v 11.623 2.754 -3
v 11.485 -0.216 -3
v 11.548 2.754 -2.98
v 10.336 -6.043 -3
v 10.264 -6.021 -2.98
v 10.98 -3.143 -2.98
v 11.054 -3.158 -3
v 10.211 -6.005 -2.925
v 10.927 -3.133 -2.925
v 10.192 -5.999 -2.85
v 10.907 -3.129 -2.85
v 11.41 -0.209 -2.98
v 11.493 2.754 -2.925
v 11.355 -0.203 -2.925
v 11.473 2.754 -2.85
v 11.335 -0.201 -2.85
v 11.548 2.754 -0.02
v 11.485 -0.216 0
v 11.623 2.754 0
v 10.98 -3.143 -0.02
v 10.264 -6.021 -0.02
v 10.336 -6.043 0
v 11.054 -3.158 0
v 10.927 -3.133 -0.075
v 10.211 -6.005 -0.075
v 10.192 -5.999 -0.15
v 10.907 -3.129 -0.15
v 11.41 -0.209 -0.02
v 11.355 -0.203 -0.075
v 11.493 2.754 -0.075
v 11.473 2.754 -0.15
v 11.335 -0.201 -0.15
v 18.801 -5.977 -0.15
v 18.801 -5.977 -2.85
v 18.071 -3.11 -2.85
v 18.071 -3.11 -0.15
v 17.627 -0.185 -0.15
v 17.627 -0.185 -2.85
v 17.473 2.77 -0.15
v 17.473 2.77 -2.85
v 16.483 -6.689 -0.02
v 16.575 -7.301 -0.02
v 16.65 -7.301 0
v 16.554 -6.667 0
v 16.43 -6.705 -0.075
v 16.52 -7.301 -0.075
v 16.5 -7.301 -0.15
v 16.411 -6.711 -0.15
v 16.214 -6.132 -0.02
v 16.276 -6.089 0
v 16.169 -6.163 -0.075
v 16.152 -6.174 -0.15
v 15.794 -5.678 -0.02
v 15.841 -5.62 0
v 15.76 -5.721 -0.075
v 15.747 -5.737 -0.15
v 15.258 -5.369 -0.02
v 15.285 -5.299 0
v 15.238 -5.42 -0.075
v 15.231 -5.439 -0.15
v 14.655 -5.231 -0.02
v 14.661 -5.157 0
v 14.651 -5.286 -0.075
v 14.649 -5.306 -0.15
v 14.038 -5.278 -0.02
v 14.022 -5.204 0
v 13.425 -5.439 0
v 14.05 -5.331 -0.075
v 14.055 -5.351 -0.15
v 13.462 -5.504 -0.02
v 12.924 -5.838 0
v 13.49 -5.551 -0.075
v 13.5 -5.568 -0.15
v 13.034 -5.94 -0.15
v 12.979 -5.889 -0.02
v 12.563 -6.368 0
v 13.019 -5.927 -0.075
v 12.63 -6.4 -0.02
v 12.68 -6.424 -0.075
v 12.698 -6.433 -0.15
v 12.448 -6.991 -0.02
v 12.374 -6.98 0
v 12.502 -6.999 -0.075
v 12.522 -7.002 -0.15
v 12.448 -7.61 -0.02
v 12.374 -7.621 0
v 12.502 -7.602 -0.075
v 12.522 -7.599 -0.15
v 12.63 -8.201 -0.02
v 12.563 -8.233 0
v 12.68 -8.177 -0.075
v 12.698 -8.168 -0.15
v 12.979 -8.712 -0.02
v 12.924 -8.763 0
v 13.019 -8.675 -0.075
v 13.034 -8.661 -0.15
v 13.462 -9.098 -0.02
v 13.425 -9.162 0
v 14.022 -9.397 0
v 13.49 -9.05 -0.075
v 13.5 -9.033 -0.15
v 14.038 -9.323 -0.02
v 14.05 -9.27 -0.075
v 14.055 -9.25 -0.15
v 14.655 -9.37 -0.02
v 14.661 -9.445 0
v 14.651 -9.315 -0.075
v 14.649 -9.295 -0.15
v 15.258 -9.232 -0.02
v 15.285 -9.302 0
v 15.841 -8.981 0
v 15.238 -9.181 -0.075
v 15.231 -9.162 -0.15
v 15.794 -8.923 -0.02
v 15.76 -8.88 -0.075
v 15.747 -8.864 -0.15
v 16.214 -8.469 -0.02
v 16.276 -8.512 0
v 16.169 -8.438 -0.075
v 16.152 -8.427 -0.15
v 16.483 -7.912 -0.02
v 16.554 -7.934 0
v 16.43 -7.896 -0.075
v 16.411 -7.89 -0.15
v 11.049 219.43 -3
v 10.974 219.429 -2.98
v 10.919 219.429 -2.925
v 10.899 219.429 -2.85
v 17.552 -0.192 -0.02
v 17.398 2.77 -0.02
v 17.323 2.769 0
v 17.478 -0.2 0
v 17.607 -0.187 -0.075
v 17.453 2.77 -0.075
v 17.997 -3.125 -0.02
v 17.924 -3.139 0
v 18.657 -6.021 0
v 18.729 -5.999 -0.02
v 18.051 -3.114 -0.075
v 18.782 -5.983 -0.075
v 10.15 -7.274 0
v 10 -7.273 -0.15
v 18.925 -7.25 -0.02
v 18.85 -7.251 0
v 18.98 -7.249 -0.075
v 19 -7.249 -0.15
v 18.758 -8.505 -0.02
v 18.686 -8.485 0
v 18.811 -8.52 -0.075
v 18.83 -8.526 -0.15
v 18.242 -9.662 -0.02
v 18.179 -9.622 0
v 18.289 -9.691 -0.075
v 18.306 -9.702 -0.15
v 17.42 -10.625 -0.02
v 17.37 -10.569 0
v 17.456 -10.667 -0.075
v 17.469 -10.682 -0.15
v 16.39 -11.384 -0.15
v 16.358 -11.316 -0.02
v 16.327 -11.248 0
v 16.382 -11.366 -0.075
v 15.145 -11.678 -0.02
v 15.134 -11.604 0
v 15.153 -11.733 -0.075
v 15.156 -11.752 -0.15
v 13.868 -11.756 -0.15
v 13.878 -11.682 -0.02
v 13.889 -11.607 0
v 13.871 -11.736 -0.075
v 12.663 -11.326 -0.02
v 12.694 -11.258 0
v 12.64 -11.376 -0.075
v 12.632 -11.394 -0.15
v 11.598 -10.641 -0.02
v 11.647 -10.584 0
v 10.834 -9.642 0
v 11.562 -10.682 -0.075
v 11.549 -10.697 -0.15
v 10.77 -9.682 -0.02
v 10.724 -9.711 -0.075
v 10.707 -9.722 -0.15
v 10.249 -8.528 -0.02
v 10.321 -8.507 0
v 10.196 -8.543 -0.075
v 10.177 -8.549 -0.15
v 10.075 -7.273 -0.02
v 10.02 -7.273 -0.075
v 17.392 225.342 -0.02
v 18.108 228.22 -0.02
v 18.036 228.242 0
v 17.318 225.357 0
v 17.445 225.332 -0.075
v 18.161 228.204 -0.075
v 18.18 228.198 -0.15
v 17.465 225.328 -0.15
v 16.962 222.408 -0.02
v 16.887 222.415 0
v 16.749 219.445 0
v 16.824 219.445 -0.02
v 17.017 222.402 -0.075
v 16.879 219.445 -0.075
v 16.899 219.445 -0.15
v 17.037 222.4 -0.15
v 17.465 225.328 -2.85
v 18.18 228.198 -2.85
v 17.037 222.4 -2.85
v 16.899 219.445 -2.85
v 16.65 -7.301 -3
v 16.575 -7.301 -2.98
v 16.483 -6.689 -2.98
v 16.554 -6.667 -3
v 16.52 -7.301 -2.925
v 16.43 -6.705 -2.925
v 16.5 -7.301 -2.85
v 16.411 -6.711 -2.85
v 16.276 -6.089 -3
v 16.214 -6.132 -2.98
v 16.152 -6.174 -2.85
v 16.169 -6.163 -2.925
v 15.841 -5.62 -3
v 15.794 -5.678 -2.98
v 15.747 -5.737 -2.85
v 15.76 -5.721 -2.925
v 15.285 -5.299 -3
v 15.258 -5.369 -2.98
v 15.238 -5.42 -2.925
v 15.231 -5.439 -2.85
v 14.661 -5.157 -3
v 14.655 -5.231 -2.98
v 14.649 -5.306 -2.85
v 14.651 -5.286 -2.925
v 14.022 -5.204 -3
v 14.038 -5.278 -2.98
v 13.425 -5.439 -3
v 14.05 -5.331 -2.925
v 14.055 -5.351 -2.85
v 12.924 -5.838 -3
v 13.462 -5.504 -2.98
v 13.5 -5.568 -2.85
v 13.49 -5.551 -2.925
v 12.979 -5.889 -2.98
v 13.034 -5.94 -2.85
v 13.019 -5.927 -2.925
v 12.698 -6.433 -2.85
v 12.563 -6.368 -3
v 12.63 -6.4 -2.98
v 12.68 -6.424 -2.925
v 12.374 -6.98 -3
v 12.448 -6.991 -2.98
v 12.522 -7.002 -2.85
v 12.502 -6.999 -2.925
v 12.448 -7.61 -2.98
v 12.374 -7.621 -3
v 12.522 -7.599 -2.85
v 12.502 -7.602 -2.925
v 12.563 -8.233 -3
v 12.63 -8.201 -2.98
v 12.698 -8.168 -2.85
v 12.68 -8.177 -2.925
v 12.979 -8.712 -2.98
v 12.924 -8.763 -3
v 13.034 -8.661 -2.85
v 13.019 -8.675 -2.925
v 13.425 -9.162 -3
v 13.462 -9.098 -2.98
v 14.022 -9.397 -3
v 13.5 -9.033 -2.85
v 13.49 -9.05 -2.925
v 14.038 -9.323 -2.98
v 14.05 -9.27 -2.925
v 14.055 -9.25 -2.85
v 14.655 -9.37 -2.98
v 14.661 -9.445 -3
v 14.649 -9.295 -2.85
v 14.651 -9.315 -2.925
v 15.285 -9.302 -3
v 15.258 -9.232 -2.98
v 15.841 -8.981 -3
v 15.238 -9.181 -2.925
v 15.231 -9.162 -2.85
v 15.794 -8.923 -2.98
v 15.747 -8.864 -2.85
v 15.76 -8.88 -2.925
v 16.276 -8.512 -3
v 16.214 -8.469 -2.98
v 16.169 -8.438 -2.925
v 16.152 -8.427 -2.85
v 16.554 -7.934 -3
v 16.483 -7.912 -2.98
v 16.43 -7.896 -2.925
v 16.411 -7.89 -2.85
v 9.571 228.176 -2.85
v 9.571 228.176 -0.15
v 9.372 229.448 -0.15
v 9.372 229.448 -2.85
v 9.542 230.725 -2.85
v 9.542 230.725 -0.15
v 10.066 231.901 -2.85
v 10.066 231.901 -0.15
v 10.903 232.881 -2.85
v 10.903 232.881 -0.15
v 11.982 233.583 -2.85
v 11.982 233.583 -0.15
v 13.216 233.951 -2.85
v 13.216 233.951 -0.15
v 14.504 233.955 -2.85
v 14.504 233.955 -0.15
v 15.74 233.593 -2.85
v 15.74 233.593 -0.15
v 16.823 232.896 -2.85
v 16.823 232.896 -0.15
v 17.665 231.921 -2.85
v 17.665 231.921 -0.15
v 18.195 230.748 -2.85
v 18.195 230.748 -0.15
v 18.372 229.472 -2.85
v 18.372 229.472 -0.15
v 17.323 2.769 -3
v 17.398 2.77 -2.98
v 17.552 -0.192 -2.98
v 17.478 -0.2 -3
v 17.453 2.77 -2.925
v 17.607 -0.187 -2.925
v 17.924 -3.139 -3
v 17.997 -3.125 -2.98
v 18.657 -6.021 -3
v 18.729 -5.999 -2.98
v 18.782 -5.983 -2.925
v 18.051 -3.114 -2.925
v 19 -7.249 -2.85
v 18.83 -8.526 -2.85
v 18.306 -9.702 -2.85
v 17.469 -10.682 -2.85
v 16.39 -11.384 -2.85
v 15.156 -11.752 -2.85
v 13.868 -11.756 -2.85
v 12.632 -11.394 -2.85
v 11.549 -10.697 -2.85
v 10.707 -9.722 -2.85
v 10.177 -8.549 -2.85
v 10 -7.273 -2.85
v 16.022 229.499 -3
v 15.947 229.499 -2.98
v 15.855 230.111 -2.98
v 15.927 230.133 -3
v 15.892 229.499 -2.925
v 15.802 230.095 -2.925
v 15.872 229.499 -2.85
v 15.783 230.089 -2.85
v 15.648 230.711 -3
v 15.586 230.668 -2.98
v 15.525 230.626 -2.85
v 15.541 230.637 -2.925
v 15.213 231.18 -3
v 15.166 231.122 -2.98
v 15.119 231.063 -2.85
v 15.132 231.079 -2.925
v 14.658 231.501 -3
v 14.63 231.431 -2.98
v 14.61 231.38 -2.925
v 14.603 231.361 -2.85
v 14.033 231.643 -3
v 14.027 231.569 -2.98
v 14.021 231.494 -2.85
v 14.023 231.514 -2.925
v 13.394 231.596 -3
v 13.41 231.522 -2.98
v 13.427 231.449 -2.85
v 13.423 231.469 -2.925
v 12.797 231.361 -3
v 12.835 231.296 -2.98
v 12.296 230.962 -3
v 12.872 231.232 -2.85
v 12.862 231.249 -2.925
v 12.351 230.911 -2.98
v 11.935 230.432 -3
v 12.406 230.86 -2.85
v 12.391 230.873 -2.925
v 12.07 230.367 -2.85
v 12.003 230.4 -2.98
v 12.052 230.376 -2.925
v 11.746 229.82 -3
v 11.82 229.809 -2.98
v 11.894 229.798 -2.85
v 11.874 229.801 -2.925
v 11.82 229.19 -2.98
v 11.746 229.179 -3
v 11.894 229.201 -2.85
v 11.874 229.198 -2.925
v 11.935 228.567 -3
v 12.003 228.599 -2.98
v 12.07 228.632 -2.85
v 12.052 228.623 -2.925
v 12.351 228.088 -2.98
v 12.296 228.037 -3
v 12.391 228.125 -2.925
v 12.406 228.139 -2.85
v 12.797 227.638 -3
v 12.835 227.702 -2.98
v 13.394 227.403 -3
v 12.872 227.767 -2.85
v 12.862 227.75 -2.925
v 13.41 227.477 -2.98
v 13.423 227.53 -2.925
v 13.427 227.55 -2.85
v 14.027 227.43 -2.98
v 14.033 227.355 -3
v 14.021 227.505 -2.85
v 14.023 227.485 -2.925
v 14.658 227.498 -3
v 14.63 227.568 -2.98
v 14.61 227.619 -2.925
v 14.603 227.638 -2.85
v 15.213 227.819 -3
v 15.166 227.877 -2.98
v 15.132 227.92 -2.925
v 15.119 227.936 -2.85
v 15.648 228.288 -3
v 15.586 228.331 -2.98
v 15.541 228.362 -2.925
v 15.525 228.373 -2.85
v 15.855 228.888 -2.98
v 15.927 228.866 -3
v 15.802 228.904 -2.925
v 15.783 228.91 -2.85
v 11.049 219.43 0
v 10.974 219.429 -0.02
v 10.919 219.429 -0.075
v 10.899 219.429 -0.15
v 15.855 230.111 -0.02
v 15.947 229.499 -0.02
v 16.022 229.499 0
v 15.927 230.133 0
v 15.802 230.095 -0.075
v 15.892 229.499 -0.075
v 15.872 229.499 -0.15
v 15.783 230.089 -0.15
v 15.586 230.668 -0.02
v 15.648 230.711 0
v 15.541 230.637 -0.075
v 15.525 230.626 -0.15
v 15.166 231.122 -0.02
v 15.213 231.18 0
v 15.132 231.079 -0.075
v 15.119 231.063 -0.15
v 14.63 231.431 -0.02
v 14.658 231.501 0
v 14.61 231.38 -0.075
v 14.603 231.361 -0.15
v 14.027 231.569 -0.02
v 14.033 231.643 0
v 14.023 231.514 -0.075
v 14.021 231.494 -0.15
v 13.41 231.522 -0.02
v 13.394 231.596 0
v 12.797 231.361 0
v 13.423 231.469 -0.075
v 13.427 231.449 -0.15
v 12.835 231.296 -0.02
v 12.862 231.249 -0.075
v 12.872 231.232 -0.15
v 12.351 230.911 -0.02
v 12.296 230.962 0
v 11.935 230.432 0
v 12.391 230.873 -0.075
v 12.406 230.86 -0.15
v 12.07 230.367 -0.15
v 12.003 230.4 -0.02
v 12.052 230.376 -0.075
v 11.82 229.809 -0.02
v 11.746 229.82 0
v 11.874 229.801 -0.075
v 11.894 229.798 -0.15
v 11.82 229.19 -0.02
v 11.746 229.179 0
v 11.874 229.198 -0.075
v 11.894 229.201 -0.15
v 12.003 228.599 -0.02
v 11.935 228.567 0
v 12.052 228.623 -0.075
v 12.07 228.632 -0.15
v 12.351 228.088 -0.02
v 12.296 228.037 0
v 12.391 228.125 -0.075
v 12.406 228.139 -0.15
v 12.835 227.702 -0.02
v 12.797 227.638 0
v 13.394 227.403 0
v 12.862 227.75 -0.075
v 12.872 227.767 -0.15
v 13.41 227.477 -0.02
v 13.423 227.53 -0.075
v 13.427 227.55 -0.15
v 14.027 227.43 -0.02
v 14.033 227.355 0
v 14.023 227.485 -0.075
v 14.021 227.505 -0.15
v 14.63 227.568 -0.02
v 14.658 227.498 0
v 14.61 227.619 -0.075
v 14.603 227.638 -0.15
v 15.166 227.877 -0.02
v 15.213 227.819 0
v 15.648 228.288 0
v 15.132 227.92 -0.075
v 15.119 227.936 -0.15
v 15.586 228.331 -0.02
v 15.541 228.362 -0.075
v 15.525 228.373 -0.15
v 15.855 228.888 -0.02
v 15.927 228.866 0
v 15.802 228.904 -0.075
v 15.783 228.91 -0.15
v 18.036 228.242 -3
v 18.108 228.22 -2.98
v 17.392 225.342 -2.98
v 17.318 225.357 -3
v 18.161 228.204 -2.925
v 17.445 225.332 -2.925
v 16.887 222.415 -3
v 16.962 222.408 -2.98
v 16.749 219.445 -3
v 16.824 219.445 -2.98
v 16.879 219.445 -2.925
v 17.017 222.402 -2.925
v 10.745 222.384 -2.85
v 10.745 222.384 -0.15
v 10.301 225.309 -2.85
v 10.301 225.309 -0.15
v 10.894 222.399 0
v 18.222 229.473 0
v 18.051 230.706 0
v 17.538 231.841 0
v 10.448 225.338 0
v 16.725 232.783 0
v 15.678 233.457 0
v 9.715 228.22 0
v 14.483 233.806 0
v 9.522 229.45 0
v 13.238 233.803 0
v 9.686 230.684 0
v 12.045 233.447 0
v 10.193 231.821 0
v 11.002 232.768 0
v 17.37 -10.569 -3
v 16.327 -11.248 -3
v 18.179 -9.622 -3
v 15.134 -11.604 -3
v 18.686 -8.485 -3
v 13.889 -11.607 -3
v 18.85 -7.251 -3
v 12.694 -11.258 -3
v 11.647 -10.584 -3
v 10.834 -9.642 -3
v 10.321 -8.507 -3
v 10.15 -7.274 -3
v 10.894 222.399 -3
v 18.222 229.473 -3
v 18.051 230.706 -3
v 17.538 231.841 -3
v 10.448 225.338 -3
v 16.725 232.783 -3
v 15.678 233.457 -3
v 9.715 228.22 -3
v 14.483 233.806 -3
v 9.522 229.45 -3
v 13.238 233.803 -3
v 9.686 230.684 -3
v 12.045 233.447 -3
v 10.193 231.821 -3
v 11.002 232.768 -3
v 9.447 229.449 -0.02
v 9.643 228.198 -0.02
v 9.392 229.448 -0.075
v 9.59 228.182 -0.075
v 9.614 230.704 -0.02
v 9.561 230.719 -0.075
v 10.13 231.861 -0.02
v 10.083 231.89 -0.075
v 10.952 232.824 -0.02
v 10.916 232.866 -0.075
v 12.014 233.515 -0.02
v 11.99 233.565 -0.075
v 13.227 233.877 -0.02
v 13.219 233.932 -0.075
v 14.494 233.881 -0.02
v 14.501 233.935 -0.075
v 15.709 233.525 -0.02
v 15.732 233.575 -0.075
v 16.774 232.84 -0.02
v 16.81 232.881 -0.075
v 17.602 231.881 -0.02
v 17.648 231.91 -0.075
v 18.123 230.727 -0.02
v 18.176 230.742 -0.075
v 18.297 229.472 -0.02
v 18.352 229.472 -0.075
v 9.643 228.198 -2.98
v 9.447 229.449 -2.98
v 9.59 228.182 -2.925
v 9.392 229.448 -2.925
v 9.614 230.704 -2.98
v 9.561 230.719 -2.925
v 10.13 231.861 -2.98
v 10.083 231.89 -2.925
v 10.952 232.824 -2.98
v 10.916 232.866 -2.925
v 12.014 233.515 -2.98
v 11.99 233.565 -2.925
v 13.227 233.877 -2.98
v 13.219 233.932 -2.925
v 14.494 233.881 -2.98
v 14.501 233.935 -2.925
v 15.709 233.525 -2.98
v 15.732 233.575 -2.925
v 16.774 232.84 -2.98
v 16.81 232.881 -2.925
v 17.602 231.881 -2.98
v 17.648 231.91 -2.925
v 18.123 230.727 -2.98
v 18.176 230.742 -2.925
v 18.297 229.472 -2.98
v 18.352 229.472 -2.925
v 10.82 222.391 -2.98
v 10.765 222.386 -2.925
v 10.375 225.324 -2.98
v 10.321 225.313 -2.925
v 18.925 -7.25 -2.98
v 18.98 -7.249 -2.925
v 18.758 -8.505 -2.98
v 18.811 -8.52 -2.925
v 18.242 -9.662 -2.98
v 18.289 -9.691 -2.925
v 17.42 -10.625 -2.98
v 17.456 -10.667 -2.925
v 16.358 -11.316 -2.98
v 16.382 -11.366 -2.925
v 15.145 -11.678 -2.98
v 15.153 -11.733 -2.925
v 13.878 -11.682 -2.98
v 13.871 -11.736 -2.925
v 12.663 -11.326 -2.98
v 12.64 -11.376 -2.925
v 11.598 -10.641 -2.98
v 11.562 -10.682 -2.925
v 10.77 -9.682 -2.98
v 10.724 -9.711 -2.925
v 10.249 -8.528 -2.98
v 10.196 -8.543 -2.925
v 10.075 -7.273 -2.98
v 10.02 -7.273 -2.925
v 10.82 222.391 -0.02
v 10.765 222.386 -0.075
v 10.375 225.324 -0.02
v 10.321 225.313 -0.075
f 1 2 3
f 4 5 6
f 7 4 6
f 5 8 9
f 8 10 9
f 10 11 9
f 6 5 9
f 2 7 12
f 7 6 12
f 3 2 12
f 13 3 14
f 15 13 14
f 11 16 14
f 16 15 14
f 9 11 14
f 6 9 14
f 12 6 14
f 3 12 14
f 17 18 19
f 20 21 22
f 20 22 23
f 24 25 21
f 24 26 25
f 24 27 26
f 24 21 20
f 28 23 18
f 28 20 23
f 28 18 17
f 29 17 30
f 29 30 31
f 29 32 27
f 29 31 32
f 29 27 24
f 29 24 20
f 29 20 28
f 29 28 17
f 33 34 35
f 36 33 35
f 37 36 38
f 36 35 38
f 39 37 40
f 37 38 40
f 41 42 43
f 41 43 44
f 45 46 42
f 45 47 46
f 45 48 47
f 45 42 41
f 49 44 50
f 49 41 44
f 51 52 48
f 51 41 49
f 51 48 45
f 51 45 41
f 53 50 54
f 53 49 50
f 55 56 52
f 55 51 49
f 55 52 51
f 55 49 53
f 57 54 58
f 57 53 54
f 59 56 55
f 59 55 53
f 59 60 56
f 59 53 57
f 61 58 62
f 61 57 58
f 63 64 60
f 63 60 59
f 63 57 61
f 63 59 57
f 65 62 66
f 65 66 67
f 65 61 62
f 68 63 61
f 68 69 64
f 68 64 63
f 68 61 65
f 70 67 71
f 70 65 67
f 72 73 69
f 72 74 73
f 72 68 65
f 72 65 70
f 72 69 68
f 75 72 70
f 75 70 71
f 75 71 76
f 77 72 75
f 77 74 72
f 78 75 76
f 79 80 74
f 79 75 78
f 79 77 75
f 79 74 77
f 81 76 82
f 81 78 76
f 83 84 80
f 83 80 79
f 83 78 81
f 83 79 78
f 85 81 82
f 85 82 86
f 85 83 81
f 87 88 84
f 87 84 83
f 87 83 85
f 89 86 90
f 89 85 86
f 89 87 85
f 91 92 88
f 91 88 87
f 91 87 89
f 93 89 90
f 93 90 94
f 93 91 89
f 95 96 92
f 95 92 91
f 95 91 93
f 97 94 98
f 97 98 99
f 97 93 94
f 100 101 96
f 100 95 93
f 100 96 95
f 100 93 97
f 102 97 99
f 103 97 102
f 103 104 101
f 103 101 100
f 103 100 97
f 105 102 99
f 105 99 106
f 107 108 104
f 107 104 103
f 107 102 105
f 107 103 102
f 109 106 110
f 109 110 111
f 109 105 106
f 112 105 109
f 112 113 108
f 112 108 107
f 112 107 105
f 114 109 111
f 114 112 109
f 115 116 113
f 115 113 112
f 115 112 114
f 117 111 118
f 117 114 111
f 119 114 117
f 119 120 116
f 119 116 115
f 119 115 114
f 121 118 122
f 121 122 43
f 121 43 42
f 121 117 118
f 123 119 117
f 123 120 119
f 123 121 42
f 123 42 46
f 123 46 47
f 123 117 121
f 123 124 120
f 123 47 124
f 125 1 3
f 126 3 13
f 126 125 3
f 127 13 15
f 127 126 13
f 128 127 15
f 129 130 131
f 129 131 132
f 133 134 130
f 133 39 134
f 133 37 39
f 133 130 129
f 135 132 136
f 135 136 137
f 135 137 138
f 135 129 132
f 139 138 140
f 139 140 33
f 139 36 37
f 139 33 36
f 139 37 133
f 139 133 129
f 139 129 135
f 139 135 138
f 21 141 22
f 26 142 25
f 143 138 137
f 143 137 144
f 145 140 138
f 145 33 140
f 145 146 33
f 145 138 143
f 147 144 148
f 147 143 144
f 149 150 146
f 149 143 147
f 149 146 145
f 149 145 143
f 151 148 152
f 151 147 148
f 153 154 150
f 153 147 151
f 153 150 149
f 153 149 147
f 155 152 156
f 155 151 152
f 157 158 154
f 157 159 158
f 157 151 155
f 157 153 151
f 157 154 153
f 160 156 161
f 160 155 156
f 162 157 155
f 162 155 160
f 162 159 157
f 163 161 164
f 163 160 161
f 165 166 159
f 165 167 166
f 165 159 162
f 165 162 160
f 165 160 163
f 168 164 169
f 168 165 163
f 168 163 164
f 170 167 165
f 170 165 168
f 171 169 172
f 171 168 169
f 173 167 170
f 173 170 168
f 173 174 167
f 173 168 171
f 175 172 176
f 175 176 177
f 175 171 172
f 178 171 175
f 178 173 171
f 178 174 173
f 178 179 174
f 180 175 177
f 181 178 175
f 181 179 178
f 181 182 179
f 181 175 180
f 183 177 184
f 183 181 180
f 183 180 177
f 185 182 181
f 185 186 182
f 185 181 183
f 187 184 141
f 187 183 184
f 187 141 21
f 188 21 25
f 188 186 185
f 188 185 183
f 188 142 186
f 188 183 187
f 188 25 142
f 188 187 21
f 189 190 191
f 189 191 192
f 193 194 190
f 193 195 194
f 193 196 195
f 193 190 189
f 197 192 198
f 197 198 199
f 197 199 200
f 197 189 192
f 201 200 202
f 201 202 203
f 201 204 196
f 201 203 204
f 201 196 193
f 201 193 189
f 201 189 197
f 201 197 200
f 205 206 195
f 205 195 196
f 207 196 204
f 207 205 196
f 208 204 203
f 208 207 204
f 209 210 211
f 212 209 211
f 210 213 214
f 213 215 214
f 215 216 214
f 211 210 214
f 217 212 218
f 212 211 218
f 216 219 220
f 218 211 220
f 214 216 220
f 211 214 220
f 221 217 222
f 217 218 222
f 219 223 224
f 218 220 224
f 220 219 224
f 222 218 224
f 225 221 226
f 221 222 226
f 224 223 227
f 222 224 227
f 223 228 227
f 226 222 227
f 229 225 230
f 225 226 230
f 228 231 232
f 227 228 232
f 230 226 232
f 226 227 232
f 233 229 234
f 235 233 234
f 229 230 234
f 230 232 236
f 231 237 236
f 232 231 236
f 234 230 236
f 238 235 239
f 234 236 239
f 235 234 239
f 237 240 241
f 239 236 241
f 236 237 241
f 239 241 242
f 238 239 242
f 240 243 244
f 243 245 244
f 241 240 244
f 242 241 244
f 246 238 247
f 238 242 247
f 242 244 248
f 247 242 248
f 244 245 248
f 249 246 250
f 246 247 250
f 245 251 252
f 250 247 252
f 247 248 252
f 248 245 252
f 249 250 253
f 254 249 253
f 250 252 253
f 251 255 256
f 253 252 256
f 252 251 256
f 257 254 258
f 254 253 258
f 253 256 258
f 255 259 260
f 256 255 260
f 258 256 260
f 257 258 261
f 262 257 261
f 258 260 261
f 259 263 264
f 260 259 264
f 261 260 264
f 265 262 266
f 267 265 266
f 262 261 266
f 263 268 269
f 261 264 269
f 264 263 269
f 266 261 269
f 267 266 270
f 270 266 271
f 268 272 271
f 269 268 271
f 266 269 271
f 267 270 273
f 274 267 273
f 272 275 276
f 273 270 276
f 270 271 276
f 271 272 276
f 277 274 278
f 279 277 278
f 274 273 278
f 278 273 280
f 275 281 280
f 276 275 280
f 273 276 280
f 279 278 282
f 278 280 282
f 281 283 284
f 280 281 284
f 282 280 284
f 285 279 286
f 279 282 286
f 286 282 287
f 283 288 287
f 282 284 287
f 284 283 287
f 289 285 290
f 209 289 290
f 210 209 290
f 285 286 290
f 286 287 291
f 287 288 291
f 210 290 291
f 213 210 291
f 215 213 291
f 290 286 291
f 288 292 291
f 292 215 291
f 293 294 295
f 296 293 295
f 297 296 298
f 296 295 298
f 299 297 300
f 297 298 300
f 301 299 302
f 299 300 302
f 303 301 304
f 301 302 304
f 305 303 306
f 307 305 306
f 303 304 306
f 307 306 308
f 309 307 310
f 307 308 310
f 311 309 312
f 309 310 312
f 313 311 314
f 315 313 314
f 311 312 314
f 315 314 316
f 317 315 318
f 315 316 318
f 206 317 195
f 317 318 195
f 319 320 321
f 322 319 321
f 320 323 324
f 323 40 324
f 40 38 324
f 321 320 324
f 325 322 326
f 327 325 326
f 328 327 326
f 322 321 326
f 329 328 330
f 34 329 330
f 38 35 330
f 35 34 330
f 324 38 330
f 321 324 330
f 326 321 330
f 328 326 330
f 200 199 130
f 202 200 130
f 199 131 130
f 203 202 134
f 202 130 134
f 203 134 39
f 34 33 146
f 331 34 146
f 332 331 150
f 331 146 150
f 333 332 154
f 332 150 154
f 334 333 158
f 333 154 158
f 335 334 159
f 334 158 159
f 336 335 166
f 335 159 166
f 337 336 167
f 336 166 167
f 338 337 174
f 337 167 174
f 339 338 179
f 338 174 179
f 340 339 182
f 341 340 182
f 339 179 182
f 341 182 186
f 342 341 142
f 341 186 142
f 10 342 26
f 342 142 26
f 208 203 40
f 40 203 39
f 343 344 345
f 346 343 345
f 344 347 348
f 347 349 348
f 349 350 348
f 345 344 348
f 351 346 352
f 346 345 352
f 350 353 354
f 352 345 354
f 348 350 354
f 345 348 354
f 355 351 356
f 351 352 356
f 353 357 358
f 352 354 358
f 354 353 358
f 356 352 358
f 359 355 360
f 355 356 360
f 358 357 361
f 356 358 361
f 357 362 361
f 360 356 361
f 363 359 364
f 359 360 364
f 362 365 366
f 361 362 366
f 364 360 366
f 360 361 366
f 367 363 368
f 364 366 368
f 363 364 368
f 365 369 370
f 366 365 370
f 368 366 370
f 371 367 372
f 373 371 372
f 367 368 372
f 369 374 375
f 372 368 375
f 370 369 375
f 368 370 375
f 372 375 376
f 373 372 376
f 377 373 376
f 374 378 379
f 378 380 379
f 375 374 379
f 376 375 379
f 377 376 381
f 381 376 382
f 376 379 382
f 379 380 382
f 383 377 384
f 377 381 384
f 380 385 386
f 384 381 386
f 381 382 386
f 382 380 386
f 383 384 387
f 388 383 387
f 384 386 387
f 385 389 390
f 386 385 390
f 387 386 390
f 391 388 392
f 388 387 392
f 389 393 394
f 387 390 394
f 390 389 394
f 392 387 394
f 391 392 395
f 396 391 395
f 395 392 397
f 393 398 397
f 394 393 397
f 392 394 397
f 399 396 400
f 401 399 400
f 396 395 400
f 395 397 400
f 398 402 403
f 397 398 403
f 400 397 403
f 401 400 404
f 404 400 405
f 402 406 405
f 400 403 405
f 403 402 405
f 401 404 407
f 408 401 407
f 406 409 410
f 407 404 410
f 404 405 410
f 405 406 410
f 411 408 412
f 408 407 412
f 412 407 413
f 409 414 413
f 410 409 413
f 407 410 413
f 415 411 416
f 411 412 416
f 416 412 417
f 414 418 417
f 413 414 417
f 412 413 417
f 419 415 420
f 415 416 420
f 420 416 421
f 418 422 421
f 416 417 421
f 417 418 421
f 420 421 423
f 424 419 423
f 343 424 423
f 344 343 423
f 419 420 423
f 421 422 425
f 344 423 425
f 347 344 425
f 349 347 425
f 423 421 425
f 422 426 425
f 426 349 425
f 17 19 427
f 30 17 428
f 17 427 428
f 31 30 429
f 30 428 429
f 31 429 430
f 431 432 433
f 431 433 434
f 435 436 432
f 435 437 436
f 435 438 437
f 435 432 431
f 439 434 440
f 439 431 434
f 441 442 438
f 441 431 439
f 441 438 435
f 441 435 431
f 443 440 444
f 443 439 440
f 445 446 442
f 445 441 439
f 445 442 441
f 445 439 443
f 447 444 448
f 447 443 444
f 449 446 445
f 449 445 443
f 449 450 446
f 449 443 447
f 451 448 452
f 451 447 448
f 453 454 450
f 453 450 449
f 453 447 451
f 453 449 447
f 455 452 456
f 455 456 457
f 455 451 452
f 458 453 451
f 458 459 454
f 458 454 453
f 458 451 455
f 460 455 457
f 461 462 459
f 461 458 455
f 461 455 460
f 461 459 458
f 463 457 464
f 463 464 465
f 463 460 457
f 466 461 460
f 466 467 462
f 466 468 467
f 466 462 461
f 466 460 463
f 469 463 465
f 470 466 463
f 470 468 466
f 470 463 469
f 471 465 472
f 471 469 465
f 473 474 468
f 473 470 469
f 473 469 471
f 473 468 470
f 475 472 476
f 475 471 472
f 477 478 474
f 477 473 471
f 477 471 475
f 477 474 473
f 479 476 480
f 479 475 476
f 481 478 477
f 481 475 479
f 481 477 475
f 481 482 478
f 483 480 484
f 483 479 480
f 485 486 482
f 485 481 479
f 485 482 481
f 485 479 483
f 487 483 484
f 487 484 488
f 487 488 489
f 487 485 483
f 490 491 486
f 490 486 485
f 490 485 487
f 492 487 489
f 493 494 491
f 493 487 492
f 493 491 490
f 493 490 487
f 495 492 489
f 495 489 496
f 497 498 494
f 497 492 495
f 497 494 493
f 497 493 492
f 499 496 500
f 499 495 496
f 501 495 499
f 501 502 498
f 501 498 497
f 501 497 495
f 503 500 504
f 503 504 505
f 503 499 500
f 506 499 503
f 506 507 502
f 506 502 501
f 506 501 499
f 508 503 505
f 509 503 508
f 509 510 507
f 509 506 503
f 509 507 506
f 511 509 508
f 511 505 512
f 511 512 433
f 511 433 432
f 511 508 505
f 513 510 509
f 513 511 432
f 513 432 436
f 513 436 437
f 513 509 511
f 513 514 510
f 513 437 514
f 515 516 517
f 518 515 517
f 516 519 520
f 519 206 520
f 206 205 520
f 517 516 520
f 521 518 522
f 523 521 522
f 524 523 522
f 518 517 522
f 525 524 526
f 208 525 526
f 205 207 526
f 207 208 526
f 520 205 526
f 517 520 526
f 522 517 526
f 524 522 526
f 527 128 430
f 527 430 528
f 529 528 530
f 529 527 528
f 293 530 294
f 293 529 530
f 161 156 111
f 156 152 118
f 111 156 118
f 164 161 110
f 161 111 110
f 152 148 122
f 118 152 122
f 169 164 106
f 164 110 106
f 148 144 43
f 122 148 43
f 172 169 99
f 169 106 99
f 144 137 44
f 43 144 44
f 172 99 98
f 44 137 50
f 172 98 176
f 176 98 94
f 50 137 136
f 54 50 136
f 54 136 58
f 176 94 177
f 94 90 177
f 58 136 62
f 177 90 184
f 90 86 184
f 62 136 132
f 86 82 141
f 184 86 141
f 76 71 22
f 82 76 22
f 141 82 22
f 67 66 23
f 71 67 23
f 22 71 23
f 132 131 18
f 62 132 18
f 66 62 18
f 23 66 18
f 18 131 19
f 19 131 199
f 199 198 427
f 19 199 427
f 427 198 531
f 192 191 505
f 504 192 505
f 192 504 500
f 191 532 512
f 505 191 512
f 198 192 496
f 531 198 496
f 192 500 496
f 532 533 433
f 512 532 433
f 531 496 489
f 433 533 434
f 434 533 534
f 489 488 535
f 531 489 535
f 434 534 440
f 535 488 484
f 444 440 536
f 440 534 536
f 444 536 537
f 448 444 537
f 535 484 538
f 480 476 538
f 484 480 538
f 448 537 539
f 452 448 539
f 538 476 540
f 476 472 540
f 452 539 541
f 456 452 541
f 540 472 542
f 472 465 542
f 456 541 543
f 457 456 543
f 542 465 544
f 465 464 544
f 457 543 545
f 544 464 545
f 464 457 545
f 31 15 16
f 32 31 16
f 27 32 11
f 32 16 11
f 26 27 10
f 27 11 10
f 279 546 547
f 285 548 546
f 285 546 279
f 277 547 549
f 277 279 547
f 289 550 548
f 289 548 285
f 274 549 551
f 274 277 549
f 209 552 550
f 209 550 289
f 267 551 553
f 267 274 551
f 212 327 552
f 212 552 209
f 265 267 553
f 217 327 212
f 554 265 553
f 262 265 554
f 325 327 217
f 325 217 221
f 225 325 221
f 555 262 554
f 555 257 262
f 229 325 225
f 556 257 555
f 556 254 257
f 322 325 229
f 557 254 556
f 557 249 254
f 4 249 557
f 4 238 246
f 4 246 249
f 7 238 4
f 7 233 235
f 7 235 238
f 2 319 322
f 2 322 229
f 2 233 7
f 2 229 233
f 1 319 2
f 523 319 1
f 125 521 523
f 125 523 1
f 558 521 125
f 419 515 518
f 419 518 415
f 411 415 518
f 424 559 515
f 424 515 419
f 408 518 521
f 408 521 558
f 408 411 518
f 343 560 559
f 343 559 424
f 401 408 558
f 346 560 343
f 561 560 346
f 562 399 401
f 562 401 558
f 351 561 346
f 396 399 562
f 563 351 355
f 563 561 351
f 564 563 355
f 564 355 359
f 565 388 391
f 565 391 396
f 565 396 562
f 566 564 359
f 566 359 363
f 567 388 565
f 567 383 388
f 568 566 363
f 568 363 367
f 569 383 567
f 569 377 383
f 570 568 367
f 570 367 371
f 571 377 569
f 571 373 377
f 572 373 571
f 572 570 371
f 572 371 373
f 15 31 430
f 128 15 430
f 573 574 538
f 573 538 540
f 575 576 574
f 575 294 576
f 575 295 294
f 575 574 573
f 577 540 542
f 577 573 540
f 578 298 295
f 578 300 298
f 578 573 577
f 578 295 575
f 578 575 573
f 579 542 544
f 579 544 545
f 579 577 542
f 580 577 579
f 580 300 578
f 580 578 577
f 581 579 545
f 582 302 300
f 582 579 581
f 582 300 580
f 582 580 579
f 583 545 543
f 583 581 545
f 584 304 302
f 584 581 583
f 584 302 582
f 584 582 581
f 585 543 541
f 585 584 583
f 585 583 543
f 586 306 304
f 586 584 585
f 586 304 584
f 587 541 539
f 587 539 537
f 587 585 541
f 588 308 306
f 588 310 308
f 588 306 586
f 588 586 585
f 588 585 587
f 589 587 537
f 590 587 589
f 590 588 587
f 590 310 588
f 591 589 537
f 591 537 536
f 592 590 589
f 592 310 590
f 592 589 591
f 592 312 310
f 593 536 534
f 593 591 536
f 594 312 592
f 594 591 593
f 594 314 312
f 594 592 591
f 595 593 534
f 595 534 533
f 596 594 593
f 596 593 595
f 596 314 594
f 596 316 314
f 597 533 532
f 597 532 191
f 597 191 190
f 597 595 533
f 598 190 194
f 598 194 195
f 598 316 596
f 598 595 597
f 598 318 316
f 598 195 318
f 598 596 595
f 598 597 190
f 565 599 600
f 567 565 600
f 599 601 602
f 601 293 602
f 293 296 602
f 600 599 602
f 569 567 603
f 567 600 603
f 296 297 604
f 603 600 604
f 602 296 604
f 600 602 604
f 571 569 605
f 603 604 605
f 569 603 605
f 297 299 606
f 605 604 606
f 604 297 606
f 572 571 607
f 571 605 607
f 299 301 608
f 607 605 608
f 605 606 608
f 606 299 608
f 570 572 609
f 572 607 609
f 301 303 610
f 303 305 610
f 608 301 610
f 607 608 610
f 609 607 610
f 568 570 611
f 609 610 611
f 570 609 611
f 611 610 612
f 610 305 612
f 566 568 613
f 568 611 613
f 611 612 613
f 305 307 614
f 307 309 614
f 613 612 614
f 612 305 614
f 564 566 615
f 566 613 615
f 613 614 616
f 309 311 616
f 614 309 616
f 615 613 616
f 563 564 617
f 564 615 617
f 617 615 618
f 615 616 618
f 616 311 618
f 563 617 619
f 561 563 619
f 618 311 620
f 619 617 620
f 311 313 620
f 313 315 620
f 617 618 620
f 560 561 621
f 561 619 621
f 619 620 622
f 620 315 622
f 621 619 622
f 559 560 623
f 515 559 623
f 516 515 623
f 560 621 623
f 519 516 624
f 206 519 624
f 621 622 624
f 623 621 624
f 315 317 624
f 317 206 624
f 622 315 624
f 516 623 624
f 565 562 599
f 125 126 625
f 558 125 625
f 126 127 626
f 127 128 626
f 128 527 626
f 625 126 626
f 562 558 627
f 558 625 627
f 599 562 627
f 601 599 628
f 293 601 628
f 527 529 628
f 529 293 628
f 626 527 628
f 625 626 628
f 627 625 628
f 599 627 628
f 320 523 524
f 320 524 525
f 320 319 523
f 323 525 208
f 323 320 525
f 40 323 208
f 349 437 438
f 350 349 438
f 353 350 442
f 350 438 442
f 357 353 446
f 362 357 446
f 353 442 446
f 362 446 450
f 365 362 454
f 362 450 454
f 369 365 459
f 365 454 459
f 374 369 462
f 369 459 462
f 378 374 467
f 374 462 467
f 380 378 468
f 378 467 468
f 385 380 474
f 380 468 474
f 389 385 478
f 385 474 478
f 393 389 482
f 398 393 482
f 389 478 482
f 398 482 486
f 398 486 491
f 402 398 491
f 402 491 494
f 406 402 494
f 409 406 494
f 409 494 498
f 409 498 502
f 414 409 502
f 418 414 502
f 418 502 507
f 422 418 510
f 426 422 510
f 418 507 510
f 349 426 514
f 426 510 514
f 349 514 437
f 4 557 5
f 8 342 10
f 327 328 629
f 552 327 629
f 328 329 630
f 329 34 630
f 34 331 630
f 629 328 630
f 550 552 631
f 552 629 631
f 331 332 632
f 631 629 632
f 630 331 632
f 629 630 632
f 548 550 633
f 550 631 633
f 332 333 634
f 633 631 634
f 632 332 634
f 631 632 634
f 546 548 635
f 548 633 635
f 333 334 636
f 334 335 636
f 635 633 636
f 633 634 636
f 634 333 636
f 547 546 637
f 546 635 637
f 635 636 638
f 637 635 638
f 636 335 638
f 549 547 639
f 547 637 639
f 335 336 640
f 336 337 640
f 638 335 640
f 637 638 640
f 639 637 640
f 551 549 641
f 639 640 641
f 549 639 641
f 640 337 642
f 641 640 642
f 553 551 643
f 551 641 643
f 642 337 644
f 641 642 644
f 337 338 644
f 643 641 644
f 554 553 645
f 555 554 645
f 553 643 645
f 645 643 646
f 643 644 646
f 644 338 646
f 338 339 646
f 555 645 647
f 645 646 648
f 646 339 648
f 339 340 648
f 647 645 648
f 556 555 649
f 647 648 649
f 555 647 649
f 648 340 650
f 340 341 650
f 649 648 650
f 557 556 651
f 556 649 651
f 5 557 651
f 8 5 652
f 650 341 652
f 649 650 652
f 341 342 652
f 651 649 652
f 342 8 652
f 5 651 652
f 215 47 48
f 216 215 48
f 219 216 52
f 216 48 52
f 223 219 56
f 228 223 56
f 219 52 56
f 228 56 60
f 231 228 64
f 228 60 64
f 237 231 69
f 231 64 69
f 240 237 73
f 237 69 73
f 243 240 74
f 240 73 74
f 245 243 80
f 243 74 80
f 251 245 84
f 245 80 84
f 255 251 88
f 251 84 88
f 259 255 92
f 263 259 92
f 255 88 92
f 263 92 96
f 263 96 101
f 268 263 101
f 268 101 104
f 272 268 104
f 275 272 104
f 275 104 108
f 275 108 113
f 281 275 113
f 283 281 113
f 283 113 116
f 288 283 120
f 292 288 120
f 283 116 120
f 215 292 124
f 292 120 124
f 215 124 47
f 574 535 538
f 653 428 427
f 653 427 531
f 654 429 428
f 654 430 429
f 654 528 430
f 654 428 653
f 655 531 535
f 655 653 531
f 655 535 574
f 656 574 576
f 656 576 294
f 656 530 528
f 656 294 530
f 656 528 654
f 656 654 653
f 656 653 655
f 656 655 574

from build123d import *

# Parameters (mm, degrees)
SKETCH1_R           = 2
BOSS_EXTRUDE1_DEPTH = 3
FILLET1_R           = 30
FILLET2_R           = 0.15


with BuildPart() as part:
    # Sketch1 → Boss-Extrude1 (new body)
    with BuildSketch(Plane.XY):
        with BuildLine():
            Line((11.491115757, -3.954385983), (10.880930887, 226.137433673))
            ThreePointArc((10.880930887, 226.137433673), (13.860091969, 233.999463751), (16.880909789, 226.153345131))
            Line((16.880909789, 226.153345131), (17.491094659, -3.938474525))
            ThreePointArc((17.491094659, -3.938474525), (14.511933577, -11.800504602), (11.491115757, -3.954385983))
        make_face()
        with Locations((13.872025562, 229.499479574)):
            Circle(SKETCH1_R, mode=Mode.SUBTRACT)
        with Locations((14.499999983, -7.300520426)):
            Circle(SKETCH1_R, mode=Mode.SUBTRACT)
    extrude(amount=-BOSS_EXTRUDE1_DEPTH)

    # Fillet1
    fillet1_edges = [part.edges().sort_by_distance(p)[0] for p in [
        (10.880930887, 226.137433673, -1.5),
        (16.880909789, 226.153345131, -1.5),
        (17.491094659, -3.938474525, -1.5),
        (11.491115757, -3.954385983, -1.5),
    ]]
    fillet(fillet1_edges, radius=FILLET1_R)

    # Fillet2
    fillet2_edges = [part.edges().sort_by_distance(p)[0] for p in [
        (12.499999983, -7.300520426, 0),
        (11.872025562, 229.499479574, -3),
        (14.511933577, -11.800504602, 0),
        (14.511933577, -11.800504602, -3),
        (17.186002224, 111.107435303, 0),
        (17.186002224, 111.107435303, -3),
        (11.186023322, 111.091523845, 0),
        (11.186023322, 111.091523845, -3),
        (13.860091969, 233.999463751, 0),
        (13.860091969, 233.999463751, -3),
        (17.812912735, -1.652667807, 0),
        (17.812912735, -1.652667807, -3),
        (11.157178744, -1.670318274, 0),
        (11.157178744, -1.670318274, -3),
        (10.559112811, 223.851626955, 0),
        (10.559112811, 223.851626955, -3),
        (17.214846802, 223.869277422, 0),
        (17.214846802, 223.869277422, -3),
        (12.499999983, -7.300520426, -3),
        (11.872025562, 229.499479574, 0),
    ]]
    fillet(fillet2_edges, radius=FILLET2_R)


solid = part.part
